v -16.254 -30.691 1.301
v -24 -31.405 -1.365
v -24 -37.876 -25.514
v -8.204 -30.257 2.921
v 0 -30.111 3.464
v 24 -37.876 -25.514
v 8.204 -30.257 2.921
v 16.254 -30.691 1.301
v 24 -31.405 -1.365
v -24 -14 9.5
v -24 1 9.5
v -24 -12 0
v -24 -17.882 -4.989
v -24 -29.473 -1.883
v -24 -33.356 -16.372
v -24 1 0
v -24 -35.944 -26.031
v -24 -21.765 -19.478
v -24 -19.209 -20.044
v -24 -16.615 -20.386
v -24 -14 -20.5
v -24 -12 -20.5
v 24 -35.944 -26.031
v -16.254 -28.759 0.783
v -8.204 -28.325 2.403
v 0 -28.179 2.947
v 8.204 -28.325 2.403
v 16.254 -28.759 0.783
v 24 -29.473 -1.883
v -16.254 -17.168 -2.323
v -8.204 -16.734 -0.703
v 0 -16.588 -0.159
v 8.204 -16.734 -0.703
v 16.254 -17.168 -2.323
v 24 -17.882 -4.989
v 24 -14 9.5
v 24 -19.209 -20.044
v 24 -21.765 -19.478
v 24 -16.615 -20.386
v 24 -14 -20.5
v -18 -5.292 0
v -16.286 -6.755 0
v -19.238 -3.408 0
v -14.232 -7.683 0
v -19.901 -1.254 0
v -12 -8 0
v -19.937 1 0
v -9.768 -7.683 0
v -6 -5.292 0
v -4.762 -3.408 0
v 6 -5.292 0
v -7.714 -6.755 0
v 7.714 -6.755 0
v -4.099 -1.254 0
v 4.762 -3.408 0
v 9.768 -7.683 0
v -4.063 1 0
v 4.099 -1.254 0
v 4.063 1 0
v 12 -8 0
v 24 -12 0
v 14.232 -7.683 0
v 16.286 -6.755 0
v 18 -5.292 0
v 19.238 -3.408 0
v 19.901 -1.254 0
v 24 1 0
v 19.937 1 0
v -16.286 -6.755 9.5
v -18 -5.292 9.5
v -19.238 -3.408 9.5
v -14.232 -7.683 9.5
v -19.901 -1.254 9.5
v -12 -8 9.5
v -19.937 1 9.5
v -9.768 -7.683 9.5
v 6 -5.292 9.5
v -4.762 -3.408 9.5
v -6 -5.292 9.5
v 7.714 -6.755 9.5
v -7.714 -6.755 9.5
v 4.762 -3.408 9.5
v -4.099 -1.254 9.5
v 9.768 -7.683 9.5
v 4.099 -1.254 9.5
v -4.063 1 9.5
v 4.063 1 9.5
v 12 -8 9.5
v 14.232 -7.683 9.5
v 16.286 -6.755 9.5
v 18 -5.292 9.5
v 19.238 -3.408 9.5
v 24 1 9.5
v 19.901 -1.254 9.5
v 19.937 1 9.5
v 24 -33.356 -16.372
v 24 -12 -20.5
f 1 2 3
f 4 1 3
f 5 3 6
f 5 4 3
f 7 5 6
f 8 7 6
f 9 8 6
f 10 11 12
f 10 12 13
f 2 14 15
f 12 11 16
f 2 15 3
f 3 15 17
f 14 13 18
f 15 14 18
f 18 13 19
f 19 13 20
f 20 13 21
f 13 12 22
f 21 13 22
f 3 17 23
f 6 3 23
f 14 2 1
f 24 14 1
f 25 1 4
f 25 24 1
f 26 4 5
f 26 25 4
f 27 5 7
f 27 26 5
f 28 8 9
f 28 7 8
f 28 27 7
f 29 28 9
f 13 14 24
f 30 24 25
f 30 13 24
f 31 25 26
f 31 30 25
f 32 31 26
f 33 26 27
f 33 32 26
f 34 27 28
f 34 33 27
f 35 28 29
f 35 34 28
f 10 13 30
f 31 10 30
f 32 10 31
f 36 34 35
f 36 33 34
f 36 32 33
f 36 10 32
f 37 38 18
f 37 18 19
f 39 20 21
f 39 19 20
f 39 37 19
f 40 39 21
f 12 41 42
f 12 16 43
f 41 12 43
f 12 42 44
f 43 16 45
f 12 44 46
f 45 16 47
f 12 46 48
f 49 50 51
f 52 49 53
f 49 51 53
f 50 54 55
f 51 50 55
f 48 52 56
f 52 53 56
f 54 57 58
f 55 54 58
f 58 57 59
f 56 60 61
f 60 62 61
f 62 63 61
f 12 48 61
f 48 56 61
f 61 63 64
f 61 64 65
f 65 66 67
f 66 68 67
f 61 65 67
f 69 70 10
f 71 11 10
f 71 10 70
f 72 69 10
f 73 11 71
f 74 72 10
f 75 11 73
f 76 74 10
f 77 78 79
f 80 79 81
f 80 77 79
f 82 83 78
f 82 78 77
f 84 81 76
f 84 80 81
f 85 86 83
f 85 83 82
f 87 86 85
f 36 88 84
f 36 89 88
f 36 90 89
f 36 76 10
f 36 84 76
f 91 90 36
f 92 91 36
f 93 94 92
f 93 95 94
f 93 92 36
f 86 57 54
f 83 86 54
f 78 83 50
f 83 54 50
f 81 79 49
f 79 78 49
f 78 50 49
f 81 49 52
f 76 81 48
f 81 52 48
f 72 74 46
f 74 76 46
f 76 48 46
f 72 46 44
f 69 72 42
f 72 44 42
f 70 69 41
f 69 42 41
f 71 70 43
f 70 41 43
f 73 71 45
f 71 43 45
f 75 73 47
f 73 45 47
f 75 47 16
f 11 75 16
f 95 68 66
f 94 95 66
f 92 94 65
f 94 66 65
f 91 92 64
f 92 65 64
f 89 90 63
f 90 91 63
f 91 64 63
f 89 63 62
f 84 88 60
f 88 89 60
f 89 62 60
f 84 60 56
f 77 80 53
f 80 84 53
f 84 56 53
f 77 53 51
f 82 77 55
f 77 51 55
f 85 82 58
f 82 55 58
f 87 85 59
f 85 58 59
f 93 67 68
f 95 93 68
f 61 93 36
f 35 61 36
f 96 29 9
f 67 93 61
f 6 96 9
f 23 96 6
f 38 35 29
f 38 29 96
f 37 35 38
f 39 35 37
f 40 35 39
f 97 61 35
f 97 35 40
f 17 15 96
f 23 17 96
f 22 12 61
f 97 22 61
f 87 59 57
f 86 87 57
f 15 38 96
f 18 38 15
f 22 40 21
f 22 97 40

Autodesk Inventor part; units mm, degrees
ref_plane "YZ Plane" through (0, 0, 0) normal (1, 0, 0) x (0, 1, 0)
ref_plane "XZ Plane" through (0, 0, 0) normal (0, 1, 0) x (-1, 0, 0)
ref_plane "XY Plane" through (0, 0, 0) normal (0, 0, 1) x (1, 0, 0)
sketch "Sketch1" plane through (0, 0, 0) normal (0, 0, 1) x (1, 0, 0)
  arc A0 (-19.9373, 1) -> (-4.0627, 1) centre (-12, 0) ccw
  arc A1 (4.0627, 1) -> (19.9373, 1) centre (12, 0) ccw
  line L0 (0, 1) -> (-4.0627, 1)
  line L1 (0, 1) -> (4.0627, 1)
  line L2 (-24, 0) -> (-24, 1)
  line L3 (-19.9373, 1) -> (-24, 1)
  line L4 (24, 0) -> (24, 1)
  line L5 (24, 1) -> (19.9373, 1)
  line L6 (24, 0) -> (24, -12)
  line L7 (24, -12) -> (-24, -12)
  line L8 (-24, -12) -> (-24, 0)
  line L9 (24, 1) -> (24, -12)
  line L10 (24, -12) -> (-24, -12)
  line L11 (-24, -12) -> (-24, 1)
  line L12 (-24, 1) -> (-19.9373, 1)
  line L13 (-4.0627, 1) -> (4.0627, 1)
  line L14 (19.9373, 1) -> (24, 1)
  point P0 (0, 0)
  dimension "d4" = 12
  dimension "d5" = 12
  dimension "d6" = 1
  dimension "d7" = 12
extrude "Extrusion1" add sketch "Sketch1" along normal blind 9.5
sketch "Sketch2" plane through (-24, -12, 0) normal (0, -1, 0) x (1, 0, 0)
  line L0 (0, 9.5) -> (48, 9.5) projected
  line L1 (0, 9.5) -> (48, 9.5)
  line L2 (48, 9.5) -> (48, -20.5)
  line L3 (48, -20.5) -> (0, -20.5)
  line L4 (0, -20.5) -> (0, 9.5)
  point P0 (24, 0)
  dimension "d10" = 30
extrude "Extrusion2" add sketch "Sketch2" along normal blind 2
sketch "Sketch3" plane through (-24, -14, 0) normal (0, -1, 0) x (1, 0, 0)
  line L0 (48, 9.5) -> (0, 9.5) projected
  line L1 (0, 9.5) -> (0, -20.5) projected
  line L2 (0, -20.5) -> (48, -20.5) projected
  line L3 (48, -20.5) -> (48, 9.5) projected
  point P0 (24, 0)
revolve "Revolution1" add sketch "Sketch3" angle 15 about axis through (24, -14, 9.5) along (-1, 0, 0)
sketch "Sketch4" plane through (-24, -14, 9.5) normal (0, -0.9659, 0.2588) x (1, 0, 0)
  line L0 (48, -28.9778) -> (48, -30) projected
  line L1 (48, -30) -> (0, -30)
  line L2 (0, -30) -> (0, -15)
  line L3 (48, -15) -> (48, -30)
  line L4 (48, -8.6587) -> (48, -28.4601) projected
  line L5 (0, -28.4601) -> (0, -8.6587) projected
  arc A0 (48, -15) -> (0, -15) centre (24, -70.1) ccw
  point P0 (24, -5.5528)
extrude "Extrusion3" add sketch "Sketch4" along normal blind 12
sketch "Sketch5" plane through (-24, -25.5911, 12.6058) normal (0, -0.9659, 0.2588) x (1, 0, 0)
  arc A0 (48, -15) -> (0, -15) centre (24, -70.1) ccw projected
  arc A1 (48, -15) -> (0, -15) centre (24, -70.1) ccw
  line L0 (48, -15) -> (48, -40)
  line L1 (0, -15) -> (0, -40)
  line L2 (0, -40) -> (48, -40)
  point P0 (24, -5.5528)
  dimension "d19" = 25
  dimension "d20" = 25
extrude "Extrusion4" add sketch "Sketch5" along normal blind 2
properties part number "HatSensorMount02FB"
